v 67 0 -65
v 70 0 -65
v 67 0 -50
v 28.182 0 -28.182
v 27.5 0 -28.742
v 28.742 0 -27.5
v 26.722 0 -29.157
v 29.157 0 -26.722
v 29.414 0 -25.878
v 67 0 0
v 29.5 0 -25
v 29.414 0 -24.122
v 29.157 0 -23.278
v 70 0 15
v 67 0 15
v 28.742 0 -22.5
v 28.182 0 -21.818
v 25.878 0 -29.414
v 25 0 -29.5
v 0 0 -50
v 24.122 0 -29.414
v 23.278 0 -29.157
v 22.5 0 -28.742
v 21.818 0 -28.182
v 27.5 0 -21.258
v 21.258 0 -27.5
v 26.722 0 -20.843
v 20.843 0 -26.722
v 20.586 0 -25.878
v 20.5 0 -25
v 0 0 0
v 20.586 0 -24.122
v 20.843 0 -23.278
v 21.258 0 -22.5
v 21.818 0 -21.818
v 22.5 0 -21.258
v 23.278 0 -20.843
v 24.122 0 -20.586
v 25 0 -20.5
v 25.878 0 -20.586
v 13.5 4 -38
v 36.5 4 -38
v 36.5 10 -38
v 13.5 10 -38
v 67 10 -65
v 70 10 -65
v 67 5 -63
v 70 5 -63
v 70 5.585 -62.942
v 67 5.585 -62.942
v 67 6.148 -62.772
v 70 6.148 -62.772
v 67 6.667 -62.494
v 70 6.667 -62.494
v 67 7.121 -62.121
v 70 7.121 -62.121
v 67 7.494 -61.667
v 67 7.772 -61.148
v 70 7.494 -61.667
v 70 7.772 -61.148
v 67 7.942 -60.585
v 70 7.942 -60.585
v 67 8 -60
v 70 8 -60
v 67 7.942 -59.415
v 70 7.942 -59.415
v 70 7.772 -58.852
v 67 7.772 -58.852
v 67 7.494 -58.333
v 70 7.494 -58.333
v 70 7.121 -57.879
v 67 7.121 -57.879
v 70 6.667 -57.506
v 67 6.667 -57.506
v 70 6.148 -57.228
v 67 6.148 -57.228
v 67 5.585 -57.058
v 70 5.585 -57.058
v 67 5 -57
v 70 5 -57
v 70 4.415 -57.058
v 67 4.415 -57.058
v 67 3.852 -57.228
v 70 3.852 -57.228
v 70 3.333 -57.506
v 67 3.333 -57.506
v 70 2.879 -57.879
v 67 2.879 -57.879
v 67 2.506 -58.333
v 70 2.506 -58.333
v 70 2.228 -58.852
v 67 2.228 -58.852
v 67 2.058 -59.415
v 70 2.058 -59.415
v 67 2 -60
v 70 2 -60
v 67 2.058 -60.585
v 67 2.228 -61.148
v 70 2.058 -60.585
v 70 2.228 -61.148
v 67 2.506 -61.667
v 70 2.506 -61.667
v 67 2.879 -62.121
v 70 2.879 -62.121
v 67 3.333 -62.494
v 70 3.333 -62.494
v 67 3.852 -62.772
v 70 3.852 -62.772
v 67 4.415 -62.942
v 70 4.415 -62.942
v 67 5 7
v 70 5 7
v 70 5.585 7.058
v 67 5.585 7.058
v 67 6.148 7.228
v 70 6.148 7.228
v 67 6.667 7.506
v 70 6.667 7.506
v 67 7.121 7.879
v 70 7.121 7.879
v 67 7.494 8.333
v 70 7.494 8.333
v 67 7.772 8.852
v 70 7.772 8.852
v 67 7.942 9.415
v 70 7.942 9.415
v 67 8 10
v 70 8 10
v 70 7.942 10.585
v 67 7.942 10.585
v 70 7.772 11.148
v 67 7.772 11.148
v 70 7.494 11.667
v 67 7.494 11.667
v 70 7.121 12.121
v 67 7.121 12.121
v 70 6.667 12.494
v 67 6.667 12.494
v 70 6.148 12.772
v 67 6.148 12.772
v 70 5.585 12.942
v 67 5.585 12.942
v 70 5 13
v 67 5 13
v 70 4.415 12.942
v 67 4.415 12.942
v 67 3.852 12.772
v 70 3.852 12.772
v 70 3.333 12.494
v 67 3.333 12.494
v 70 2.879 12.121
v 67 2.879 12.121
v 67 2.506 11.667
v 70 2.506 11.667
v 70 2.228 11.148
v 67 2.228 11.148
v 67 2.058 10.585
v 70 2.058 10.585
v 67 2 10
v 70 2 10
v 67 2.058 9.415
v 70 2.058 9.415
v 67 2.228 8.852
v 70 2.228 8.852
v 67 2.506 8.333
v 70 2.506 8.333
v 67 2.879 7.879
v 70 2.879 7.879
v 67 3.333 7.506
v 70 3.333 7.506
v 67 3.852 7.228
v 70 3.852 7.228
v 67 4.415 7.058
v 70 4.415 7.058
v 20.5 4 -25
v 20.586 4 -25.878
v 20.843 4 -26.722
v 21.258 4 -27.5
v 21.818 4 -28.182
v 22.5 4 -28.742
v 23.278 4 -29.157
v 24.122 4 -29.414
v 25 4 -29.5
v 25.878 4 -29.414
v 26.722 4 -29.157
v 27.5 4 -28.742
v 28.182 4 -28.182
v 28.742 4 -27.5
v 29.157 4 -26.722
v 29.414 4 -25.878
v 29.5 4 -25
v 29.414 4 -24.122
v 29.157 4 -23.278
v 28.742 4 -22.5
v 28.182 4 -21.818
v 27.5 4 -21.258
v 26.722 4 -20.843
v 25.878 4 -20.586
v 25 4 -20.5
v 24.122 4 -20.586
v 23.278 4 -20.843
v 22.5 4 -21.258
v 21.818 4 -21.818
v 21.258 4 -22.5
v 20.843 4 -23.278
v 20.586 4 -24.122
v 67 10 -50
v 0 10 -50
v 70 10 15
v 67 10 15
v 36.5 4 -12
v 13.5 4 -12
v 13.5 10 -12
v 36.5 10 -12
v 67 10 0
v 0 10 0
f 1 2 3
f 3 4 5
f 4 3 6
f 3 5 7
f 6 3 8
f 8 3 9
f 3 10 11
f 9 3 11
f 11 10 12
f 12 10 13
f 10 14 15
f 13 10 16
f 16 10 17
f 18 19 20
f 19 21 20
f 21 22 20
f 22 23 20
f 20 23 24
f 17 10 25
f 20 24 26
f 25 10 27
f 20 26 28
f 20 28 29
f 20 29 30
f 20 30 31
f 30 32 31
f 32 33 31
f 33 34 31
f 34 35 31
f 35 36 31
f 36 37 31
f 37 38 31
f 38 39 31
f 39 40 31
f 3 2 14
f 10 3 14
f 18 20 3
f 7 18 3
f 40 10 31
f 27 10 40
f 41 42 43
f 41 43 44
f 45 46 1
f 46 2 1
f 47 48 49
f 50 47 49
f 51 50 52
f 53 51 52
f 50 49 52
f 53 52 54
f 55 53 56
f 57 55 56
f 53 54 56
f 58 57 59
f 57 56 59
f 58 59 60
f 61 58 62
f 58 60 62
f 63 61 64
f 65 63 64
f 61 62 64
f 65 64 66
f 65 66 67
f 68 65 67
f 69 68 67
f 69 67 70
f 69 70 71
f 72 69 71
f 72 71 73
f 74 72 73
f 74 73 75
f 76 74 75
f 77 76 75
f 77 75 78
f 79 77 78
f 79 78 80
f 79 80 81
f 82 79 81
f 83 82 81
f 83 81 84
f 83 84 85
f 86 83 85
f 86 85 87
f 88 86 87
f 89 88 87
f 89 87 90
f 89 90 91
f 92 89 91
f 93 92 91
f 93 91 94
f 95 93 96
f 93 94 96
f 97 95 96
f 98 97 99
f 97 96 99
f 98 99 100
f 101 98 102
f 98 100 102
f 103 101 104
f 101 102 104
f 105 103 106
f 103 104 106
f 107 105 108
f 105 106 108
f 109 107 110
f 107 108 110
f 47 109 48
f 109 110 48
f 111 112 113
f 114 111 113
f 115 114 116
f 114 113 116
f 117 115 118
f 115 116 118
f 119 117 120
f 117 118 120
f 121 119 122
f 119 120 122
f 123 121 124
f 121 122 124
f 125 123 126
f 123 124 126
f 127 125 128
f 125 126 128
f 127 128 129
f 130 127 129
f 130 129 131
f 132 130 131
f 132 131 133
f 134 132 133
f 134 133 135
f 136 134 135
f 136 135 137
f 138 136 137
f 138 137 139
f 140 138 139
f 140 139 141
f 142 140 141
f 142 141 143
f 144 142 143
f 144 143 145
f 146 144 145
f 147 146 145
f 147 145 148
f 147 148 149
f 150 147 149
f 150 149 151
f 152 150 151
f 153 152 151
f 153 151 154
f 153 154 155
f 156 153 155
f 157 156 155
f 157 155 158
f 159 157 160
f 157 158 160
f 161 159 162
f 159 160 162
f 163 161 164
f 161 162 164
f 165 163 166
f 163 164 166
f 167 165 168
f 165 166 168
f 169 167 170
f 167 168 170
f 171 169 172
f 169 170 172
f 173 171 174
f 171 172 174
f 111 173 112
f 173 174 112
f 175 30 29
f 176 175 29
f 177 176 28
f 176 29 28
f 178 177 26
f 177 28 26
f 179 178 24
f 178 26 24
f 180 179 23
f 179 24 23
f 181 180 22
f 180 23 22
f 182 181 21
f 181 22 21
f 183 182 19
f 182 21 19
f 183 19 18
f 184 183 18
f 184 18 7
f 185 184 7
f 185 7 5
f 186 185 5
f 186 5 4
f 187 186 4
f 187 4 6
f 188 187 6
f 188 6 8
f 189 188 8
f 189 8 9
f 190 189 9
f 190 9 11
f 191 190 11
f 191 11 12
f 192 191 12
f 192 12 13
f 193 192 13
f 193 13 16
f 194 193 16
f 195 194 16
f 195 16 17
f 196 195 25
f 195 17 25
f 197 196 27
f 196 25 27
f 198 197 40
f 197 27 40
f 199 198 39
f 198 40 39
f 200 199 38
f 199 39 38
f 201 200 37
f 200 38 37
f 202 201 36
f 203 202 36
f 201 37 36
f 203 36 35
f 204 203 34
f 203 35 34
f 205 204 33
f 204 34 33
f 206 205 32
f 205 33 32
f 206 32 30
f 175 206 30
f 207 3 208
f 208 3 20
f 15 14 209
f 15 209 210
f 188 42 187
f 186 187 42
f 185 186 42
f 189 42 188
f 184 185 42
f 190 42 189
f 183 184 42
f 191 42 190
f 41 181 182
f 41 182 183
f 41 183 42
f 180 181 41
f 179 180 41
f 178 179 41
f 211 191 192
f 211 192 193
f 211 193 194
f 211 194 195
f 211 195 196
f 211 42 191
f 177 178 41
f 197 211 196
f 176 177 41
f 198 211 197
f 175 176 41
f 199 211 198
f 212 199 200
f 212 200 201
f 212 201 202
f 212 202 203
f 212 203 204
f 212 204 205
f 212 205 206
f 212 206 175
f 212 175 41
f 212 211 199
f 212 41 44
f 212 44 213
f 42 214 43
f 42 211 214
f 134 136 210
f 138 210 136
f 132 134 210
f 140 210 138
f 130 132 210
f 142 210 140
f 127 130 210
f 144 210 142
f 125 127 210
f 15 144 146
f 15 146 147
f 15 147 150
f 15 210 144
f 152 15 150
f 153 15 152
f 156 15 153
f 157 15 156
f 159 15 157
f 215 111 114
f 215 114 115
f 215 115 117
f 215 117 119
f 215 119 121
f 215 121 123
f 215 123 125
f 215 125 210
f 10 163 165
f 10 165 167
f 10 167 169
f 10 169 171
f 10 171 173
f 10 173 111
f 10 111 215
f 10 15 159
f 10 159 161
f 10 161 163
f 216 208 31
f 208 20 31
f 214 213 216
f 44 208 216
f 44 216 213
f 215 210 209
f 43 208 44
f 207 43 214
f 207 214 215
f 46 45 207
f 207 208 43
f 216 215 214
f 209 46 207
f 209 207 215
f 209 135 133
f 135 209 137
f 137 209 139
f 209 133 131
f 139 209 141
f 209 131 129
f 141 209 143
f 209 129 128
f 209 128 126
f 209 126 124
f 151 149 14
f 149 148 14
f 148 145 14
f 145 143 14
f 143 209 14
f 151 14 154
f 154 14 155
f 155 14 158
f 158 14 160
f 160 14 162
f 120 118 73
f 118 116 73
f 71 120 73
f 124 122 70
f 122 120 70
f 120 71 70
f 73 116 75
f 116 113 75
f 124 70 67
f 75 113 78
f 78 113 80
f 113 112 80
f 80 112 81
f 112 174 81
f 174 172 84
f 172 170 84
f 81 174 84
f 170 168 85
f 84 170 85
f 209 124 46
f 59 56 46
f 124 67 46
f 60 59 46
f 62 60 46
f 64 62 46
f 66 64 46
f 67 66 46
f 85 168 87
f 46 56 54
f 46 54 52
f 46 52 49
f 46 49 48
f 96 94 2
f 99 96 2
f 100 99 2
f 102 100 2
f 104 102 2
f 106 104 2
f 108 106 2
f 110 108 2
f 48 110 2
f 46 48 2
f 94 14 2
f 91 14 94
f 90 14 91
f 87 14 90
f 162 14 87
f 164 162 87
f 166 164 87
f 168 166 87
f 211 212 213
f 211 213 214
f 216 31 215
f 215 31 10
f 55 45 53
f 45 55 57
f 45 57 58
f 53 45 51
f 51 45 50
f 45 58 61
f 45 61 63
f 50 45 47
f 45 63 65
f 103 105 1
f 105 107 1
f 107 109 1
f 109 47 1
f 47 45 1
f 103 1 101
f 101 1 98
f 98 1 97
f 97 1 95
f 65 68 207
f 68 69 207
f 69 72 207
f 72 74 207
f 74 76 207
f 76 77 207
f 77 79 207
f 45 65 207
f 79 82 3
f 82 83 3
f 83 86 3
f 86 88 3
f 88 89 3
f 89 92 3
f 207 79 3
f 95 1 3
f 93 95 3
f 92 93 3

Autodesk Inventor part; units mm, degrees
ref_plane "YZ Plane" through (0, 0, 0) normal (1, 0, 0) x (0, 1, 0)
ref_plane "XZ Plane" through (0, 0, 0) normal (0, 1, 0) x (-1, 0, 0)
ref_plane "XY Plane" through (0, 0, 0) normal (0, 0, 1) x (1, 0, 0)
sketch "Эскиз1" plane through (0, 0, 0) normal (0, 1, 0) x (-1, 0, 0)
  line L0 (0, 0) -> (-70, 0)
  line L1 (-70, 0) -> (-70, -50)
  line L2 (-70, -50) -> (0, -50)
  line L3 (0, -50) -> (0, 0)
  line L4 (-70, 0) -> (-25, 0)
  line L5 (-25, 0) -> (-25, -25)
  line L6 (-25, -25) -> (-70, -25)
  line L7 (-70, -25) -> (-70, 0)
  circle A0 centre (-25, -25) radius 4.5
  line L8 (-70, -50) -> (-70, -65)
  line L9 (-70, -65) -> (-67, -65)
  line L10 (-67, -65) -> (-67, -50)
  line L11 (-70, 0) -> (-70, 15)
  line L12 (-70, 15) -> (-67, 15)
  line L13 (-67, 15) -> (-67, 0)
  point P0 (-67, 0)
  dimension "d0" = 70
  dimension "d1" = 50
  dimension "d2" = 45
  dimension "d3" = 25
  dimension "d4" = 9
  dimension "d31" = 15
  dimension "d32" = 3
  dimension "d33" = 15
  dimension "d34" = 3
extrude "Выдавливание1" add sketch "Эскиз1" along normal blind 4 contours L3 L2 L1 L6 A0 L5 L0 | L5 A0 L6 L1 L0 | L0 L11 L12 L13 | L10 L9 L8 L2
sketch "Эскиз2" plane through (0, 4, 0) normal (0, 1, 0) x (1, 0, 0)
  circle A0 centre (25, 25) radius 4.5 projected
  line L0 (25, 25) -> (25, 12)
  line L1 (25, 12) -> (13.5, 12)
  line L2 (13.5, 12) -> (36.5, 12)
  line L3 (36.5, 12) -> (36.5, 38)
  line L4 (36.5, 38) -> (13.5, 38)
  line L5 (13.5, 38) -> (13.5, 12)
  line L6 (67, 50) -> (0, 50) projected
  line L7 (0, 0) -> (70, 0)
  line L8 (70, 0) -> (70, 50)
  line L9 (70, 50) -> (0, 50)
  line L10 (0, 50) -> (0, 0)
  line L11 (70, -15) -> (70, 65) projected
  line L12 (67, 65) -> (67, 50) projected
  line L13 (70, 65) -> (67, 65)
  line L14 (67, 65) -> (67, 50)
  line L15 (67, 50) -> (70, 50)
  line L16 (70, 50) -> (70, 65)
  line L17 (67, -15) -> (70, -15) projected
  line L18 (67, 0) -> (67, -15) projected
  line L19 (70, -15) -> (67, -15)
  line L20 (67, -15) -> (67, 0)
  line L21 (67, 0) -> (70, 0)
  line L22 (70, 0) -> (70, -15)
  dimension "d7" = 13
  dimension "d8" = 11.5
  dimension "d9" = 23
  dimension "d10" = 26
extrude "Выдавливание2" add sketch "Эскиз2" along normal blind 6 contours L9 L8 L7 L10 L6 | L12 L13 L11 L9 | L11 L17 L18 L7
sketch "Эскиз4" plane through (70, 0, 15) normal (1, 0, 0) x (0, 0, -1)
  line L0 (0, 0) -> (0, 10) projected
  line L1 (0, 5) -> (5, 5)
  line L2 (80, 0) -> (80, 10) projected
  line L3 (80, 5) -> (75, 5)
  circle A0 centre (5, 5) radius 3
  circle A1 centre (75, 5) radius 3
  point P0 (15, 0)
  dimension "d35" = 5
  dimension "d36" = 5
  dimension "d37" = 6
  dimension "d38" = 6
extrude "Выдавливание4" cut sketch "Эскиз4" against normal blind 3.75
properties part number "Стенка энкодер"
